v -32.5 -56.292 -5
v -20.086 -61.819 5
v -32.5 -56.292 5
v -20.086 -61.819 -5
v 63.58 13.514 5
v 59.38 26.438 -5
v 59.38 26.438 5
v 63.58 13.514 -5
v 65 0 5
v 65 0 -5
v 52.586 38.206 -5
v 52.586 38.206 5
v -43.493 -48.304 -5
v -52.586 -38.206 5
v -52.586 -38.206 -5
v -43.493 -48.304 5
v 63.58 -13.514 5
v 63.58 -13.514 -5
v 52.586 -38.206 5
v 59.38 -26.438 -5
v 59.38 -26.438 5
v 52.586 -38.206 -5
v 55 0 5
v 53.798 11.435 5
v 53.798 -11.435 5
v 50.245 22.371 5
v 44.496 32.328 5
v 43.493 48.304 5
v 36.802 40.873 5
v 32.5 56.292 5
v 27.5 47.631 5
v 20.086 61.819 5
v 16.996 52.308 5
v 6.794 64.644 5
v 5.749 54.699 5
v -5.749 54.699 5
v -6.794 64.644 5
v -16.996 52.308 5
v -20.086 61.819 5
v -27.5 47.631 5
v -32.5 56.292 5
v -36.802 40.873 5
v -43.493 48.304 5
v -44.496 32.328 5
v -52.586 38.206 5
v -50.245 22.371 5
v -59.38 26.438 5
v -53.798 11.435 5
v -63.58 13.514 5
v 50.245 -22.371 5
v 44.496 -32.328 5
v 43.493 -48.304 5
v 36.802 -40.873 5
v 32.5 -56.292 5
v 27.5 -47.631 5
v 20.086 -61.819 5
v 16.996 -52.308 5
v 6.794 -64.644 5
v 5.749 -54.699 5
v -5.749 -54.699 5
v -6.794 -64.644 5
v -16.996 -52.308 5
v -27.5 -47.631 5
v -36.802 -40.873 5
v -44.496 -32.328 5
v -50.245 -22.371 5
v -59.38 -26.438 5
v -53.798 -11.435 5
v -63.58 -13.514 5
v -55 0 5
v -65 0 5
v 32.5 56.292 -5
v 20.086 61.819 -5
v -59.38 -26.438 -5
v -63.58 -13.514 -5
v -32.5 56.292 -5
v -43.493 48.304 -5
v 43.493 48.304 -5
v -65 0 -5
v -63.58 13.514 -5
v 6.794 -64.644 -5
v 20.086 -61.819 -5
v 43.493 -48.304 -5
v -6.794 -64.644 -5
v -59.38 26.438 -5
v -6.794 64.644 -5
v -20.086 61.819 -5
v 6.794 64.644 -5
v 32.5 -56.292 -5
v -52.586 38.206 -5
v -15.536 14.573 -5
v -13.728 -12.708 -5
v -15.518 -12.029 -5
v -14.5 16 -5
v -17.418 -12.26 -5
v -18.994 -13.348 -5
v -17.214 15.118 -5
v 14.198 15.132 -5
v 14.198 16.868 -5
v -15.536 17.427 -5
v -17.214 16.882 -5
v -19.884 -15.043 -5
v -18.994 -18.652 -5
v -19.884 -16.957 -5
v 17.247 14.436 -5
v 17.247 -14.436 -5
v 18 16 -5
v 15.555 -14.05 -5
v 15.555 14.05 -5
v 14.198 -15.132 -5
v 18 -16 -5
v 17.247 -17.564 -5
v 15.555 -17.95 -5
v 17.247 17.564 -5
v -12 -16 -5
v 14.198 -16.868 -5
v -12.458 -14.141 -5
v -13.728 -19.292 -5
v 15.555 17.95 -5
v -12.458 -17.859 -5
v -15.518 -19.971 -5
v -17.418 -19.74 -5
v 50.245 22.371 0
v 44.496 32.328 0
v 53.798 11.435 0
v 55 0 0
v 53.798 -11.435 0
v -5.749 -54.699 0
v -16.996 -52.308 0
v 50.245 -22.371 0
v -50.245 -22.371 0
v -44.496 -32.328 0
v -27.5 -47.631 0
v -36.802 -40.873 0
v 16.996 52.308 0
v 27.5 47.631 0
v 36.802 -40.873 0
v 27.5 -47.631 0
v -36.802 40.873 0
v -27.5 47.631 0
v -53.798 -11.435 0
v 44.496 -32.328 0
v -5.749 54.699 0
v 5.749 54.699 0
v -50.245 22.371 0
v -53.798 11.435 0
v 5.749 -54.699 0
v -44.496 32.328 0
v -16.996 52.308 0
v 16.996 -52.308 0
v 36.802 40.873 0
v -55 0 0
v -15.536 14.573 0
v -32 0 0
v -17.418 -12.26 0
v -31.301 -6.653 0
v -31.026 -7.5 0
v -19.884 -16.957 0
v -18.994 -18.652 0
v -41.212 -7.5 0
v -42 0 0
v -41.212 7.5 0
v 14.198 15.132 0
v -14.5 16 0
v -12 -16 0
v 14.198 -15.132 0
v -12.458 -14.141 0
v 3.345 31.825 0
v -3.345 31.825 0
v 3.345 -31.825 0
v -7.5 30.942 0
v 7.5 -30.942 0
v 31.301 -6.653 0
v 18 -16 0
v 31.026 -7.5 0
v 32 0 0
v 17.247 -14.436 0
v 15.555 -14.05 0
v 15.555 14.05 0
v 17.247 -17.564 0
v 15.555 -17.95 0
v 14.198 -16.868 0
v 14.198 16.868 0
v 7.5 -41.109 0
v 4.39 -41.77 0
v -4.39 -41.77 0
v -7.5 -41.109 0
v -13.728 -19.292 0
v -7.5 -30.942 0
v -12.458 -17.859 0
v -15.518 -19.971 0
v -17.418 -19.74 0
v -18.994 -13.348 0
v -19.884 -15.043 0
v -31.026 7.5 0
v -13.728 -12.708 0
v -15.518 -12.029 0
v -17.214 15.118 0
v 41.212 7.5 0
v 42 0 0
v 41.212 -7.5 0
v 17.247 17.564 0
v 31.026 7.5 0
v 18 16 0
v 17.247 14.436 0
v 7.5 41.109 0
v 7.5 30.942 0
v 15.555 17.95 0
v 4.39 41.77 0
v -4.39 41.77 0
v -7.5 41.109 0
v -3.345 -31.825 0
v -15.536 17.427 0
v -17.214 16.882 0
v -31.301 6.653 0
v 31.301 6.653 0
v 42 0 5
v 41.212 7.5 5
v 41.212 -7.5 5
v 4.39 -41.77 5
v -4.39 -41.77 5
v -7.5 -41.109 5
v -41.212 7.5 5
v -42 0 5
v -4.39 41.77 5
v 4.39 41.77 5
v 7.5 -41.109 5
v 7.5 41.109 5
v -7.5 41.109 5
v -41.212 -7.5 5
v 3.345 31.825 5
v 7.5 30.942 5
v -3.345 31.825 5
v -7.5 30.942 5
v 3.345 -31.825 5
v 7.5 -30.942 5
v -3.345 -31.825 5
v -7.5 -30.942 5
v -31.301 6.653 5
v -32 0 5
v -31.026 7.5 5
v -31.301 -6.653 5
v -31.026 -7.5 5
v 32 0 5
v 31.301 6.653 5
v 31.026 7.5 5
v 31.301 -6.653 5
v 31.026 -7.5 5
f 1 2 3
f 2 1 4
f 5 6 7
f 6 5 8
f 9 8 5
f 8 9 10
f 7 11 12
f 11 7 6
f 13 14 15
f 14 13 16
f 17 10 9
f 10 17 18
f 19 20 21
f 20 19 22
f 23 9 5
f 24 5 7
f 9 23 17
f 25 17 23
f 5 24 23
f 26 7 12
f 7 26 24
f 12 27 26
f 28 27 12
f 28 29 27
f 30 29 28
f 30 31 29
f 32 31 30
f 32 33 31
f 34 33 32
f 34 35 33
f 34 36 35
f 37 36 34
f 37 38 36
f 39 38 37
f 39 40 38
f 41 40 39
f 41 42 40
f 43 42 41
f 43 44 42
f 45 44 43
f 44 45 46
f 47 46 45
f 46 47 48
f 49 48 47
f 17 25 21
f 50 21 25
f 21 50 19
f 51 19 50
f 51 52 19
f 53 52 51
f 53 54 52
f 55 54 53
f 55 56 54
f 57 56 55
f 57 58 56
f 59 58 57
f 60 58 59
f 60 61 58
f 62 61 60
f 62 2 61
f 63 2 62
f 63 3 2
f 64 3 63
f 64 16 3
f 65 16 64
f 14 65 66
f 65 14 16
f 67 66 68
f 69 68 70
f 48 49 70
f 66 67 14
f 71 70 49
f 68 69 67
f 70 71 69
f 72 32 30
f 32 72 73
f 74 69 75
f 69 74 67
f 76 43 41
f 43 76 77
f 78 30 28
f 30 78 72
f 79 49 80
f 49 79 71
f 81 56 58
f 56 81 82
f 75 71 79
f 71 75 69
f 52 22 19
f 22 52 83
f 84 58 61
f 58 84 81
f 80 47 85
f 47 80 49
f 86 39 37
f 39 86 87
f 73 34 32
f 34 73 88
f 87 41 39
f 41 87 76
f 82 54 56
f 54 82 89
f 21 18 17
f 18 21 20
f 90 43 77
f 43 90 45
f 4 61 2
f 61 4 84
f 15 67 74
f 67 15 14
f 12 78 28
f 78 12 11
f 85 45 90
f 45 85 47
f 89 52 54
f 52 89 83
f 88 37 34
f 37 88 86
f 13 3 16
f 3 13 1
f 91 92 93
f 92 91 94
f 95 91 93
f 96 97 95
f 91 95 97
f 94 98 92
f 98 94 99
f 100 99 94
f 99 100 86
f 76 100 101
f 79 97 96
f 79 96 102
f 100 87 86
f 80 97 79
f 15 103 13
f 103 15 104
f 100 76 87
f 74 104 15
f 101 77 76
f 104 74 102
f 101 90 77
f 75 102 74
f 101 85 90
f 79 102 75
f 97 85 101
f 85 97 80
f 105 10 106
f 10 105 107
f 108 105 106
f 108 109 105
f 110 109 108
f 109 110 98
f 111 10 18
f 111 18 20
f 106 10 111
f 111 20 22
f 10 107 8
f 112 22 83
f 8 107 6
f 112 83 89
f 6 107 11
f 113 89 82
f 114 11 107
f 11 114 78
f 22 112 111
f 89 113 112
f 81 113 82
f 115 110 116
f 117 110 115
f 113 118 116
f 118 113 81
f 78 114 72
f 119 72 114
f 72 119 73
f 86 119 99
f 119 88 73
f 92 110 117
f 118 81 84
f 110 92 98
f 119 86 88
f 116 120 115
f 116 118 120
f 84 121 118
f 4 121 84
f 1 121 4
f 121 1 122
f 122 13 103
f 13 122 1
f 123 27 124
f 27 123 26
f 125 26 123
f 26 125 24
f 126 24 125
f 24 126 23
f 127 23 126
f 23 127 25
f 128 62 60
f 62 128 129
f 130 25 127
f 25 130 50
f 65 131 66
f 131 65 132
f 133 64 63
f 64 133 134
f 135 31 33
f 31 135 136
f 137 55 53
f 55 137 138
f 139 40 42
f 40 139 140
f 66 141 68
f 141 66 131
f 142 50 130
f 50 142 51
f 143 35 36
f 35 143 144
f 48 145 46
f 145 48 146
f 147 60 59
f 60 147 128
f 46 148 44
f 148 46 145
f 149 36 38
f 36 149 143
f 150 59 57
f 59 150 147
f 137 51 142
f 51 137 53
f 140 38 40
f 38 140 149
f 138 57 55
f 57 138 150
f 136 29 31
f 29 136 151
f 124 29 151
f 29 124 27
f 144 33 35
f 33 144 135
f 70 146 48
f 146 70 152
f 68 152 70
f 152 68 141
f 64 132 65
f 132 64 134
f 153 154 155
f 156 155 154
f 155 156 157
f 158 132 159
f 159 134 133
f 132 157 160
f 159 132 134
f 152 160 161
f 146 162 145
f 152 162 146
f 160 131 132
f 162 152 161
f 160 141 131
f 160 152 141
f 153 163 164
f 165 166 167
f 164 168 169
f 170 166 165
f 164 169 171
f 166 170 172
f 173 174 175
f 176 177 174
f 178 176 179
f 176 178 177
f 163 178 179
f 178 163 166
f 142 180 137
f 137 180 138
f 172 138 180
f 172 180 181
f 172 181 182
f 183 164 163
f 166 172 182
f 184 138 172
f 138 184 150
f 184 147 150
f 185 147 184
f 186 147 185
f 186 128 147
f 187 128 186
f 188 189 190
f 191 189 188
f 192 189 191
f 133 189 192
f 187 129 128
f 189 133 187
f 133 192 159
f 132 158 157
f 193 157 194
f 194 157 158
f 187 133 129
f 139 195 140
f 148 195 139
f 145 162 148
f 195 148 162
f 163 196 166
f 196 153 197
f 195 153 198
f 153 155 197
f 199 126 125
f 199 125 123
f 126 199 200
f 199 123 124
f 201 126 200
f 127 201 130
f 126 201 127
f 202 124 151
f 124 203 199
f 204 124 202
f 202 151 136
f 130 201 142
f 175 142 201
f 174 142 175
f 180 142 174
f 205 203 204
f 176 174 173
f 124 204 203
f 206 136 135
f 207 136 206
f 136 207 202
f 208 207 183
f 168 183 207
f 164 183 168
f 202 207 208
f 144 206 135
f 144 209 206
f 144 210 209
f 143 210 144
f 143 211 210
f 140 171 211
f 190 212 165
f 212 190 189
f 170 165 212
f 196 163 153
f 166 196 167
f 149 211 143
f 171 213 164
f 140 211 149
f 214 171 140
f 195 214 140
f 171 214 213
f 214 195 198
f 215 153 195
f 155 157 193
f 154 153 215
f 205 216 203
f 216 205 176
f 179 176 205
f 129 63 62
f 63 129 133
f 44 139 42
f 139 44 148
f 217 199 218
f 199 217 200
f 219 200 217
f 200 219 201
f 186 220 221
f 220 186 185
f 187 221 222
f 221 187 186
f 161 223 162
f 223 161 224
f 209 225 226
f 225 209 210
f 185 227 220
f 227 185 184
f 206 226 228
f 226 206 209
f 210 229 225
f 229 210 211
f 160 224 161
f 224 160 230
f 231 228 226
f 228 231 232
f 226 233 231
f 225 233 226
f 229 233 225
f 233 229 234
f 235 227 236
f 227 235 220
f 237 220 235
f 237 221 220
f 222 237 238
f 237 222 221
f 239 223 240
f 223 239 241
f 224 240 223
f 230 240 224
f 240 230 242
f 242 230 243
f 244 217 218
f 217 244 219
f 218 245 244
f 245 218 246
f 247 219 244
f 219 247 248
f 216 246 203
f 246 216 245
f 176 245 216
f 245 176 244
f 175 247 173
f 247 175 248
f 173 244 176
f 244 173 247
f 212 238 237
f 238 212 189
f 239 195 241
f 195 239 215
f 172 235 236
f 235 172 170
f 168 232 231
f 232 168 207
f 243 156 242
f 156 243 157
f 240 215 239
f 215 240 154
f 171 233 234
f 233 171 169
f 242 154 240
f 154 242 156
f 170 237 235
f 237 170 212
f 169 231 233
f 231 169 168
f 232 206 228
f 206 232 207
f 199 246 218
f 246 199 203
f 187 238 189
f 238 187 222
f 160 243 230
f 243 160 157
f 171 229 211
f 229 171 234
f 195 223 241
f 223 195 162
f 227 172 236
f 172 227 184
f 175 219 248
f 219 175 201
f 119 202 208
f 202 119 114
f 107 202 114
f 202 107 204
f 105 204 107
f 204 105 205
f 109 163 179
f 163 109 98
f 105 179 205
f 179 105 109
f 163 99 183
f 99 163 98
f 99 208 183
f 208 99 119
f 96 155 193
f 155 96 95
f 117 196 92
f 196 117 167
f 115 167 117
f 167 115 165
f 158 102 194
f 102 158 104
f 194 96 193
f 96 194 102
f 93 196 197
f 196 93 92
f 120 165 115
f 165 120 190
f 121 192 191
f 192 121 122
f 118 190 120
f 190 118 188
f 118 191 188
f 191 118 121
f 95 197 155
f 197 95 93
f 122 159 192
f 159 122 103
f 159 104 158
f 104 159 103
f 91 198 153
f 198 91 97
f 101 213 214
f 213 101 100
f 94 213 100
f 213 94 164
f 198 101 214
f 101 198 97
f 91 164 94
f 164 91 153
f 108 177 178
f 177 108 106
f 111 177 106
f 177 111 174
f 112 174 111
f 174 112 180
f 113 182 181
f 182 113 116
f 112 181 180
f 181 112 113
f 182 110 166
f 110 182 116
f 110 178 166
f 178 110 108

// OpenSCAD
insideradius = 42;
outsideradius = 55;
height = 10;
inletradius = 2;
filterradius = 4;
inducerradius = 1.5;
sampleradius = 2;
t0 = 30;  // tab spacing
i0 = 16;  //inlet spacing

module base(size) {

    difference() {
     cylinder(r=outsideradius+10,h=size,center=true);
     translate([0,0,size/2])
        cylinder(r=outsideradius,h=size,center=true);
    } 
}
module tabs(size) {
    c0 = 45;
    difference() {
     cylinder(r=insideradius,h=size,center=true);
     translate([0,0,size/2])
        cylinder(r=insideradius-10,h=size,center=true);
     translate([t0,t0,0])
		    cube([c0,c0,10],center=true);
     translate([-t0,-t0,0])
		    cube([c0,c0,10],center=true);
     translate([-t0,t0,0])
		    cube([c0,c0,10],center=true);
     translate([t0,-t0,0])
		    cube([c0,c0,10],center=true);
    } 
}
module cap() {
	base(height);
  tabs(height);
}
module septa() {
     difference() {
        cap();
        translate([i0,i0,0])
			      cylinder(r=inletradius,h=30,center=true);
        translate([-i0,-i0,0])
			      cylinder(r=filterradius,h=30,center=true);
        translate([-i0,i0,0])
			      cylinder(r=inducerradius,h=30,center=true);
        translate([i0,-i0,0])
			      cylinder(r=sampleradius,h=30,center=true);

     }
}
septa();
